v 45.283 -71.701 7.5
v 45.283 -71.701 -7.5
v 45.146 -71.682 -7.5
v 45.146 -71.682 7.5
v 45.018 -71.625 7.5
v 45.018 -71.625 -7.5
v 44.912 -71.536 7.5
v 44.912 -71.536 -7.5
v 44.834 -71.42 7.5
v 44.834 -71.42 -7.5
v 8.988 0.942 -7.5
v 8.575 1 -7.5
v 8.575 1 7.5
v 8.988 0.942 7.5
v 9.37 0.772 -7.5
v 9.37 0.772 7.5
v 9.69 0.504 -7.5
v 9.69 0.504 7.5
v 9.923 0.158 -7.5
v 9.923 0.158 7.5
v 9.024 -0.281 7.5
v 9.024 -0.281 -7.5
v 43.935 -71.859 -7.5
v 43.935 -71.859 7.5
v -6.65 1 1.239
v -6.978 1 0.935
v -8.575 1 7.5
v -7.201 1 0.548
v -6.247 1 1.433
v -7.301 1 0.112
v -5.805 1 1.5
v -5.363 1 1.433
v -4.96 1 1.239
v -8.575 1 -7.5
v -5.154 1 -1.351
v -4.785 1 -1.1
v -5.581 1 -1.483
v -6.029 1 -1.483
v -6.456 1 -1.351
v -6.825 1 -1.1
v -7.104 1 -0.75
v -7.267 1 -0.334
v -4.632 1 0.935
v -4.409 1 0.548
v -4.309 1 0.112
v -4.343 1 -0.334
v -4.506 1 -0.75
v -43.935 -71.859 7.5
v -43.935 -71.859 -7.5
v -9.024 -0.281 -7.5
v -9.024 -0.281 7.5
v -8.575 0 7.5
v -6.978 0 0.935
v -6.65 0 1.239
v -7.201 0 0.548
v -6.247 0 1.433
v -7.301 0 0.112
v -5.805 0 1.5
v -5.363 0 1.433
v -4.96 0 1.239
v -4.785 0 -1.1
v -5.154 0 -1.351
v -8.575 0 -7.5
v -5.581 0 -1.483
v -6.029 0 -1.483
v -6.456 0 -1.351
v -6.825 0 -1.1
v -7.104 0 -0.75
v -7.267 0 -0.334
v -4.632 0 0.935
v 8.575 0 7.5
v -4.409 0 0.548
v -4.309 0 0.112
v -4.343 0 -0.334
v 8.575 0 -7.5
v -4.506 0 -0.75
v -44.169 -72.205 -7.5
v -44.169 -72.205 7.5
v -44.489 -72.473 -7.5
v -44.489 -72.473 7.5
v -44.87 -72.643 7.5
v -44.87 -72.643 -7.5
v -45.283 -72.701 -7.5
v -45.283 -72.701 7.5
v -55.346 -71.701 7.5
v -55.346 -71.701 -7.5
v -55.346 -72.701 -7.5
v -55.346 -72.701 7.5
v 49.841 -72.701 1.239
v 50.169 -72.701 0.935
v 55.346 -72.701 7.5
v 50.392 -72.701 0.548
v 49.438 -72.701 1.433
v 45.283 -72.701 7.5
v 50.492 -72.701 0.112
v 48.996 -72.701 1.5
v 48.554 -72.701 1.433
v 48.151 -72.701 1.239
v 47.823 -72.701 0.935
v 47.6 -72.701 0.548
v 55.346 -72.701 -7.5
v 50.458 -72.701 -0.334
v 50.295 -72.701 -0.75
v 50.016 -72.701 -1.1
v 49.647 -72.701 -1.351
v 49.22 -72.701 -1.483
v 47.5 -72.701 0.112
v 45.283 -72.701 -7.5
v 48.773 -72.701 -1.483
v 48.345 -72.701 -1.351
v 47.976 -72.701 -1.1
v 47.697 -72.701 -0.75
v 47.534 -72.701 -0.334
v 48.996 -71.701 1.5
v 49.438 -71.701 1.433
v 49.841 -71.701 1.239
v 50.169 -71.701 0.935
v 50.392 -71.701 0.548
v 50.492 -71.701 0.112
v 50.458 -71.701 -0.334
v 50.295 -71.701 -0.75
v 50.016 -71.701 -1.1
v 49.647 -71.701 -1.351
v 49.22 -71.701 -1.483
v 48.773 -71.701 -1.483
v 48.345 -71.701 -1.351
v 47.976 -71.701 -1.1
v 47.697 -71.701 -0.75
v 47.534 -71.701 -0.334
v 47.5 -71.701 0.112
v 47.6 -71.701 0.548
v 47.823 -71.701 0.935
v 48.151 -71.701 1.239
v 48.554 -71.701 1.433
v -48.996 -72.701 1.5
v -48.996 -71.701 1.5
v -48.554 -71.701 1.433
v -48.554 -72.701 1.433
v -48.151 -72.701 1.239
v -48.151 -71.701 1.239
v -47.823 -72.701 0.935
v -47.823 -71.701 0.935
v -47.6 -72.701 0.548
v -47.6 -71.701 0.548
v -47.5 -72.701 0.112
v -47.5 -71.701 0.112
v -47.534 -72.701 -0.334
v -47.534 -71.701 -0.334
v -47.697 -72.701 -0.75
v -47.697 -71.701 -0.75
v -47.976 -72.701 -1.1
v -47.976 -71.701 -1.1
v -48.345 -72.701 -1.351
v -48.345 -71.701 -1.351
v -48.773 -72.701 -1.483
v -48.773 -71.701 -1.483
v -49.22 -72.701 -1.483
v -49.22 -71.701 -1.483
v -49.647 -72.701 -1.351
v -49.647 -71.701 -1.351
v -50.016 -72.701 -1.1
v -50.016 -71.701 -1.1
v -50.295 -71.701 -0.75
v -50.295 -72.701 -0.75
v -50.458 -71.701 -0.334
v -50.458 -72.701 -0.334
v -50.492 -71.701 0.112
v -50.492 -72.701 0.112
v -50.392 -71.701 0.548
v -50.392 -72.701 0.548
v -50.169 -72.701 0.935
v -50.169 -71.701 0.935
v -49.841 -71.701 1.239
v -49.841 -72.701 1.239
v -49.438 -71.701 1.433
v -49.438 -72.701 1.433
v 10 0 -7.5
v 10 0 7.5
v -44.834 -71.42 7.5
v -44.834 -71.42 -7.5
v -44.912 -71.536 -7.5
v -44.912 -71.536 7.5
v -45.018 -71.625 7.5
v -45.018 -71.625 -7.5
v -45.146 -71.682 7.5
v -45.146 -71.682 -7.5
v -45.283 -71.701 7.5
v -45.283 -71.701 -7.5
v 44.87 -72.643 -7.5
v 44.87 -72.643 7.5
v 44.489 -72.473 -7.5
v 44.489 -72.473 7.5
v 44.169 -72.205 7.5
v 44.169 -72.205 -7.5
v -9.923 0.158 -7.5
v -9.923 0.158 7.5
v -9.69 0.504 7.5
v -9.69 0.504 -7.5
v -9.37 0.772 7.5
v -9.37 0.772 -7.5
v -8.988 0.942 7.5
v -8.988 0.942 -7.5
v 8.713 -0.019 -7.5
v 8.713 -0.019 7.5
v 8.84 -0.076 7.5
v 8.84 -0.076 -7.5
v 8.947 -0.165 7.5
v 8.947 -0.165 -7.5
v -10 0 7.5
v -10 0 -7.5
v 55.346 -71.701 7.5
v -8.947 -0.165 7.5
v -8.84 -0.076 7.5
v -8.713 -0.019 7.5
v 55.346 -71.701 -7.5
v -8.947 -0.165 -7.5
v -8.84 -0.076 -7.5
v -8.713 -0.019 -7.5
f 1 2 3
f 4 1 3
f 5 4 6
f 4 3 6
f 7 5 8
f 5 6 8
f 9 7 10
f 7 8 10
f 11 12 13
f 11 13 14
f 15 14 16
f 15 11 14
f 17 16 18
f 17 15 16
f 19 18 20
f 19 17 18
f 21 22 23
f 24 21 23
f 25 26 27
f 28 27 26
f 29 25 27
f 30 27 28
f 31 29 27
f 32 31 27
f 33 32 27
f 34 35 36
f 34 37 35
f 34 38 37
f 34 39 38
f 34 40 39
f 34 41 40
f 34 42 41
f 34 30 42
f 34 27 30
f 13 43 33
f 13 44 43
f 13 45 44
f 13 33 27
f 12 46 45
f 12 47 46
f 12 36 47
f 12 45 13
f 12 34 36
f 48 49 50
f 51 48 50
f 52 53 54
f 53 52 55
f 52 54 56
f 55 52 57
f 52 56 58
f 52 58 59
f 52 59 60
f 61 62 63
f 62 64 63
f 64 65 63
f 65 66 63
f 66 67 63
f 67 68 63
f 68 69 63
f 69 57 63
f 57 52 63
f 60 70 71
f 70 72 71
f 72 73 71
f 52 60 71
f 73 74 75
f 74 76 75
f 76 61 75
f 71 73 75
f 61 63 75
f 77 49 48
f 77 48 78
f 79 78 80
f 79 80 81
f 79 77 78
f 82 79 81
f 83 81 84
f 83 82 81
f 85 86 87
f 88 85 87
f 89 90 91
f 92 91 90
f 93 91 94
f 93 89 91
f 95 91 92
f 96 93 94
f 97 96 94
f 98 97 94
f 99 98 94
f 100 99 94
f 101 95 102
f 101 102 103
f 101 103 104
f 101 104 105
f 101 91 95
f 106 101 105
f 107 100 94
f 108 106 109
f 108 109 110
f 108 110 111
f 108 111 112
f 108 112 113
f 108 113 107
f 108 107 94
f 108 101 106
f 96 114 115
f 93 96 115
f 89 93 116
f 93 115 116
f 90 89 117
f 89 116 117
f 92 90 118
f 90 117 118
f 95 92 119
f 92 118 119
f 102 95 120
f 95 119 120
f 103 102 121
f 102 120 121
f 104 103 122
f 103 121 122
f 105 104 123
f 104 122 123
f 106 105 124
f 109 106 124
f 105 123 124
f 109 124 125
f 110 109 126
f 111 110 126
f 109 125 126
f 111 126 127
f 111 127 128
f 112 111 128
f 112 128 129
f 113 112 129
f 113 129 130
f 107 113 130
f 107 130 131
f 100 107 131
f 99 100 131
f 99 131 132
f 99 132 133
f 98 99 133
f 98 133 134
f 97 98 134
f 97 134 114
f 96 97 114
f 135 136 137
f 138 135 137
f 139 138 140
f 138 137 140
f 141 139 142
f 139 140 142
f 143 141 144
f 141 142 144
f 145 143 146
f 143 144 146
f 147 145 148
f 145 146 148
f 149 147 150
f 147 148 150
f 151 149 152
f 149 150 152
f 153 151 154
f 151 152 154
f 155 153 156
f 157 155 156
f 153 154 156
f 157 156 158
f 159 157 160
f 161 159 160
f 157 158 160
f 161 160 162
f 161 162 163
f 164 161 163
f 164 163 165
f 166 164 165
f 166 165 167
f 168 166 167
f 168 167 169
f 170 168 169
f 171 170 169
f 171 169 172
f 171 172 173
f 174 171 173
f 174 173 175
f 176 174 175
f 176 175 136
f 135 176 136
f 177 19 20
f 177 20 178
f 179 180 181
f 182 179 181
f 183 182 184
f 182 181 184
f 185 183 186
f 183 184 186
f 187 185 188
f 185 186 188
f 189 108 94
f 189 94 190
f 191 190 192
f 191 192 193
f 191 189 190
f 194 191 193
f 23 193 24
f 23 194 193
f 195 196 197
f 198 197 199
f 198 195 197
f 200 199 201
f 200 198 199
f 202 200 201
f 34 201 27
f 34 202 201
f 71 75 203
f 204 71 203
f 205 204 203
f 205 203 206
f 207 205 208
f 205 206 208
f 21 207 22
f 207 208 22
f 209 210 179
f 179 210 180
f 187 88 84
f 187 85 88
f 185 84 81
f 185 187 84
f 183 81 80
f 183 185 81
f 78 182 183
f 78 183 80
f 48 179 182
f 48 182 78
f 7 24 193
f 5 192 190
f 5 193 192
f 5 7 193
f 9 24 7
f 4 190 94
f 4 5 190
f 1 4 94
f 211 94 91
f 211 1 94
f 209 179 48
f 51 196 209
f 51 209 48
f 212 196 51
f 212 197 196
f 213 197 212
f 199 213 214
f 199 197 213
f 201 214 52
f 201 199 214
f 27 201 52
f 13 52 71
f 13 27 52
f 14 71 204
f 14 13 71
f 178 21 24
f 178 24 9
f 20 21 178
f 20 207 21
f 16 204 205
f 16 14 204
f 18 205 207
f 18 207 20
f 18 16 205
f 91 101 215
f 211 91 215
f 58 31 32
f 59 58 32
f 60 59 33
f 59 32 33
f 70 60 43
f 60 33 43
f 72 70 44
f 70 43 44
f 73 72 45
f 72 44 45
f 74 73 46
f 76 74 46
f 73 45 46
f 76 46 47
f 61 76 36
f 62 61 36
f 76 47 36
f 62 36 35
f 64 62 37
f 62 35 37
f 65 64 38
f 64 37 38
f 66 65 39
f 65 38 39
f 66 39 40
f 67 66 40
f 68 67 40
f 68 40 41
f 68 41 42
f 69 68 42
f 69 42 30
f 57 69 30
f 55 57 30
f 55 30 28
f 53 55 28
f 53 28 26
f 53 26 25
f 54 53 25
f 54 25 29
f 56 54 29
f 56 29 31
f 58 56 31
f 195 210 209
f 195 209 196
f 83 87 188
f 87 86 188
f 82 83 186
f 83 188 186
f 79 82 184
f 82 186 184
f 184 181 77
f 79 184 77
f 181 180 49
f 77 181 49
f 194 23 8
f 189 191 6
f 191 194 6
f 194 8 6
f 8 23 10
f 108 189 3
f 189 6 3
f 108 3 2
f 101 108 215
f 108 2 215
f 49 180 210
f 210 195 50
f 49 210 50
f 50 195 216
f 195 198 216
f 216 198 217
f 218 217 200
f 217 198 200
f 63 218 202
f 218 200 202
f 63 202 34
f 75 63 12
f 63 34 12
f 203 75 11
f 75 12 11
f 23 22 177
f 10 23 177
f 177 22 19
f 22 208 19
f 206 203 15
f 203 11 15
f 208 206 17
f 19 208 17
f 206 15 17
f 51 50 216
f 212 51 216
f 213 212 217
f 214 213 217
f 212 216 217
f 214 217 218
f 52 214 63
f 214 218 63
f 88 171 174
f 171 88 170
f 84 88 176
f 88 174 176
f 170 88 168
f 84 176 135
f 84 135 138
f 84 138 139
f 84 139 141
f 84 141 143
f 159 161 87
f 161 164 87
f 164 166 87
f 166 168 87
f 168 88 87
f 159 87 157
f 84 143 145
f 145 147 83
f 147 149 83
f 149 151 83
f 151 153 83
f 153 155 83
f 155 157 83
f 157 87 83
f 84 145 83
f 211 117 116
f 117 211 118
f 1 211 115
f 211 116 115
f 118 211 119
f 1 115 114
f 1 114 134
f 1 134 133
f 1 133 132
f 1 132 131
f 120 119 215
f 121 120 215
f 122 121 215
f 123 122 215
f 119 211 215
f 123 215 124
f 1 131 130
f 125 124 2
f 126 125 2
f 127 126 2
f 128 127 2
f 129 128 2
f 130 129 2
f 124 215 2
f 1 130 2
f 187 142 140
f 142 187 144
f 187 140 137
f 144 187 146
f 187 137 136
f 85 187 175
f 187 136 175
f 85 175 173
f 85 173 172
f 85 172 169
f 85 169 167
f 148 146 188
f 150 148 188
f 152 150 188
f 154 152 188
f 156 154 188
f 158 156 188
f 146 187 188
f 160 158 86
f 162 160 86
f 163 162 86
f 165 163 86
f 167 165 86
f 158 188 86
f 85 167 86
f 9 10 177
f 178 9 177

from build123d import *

# Parameters (mm, degrees)
SKETCH_1_W               = 20
SKETCH_1_H               = 15
EXTRUDE_1_DEPTH          = 1
SM_START                 = -7.5
SM_EDGE_FLANGE_2_DEPTH   = 15
SM_EDGE_FLANGE_2_2_DEPTH = 15
SM_EDGE_FLANGE_3_DEPTH   = 15
SM_EDGE_FLANGE_3_2_DEPTH = 15
SKETCH_27_R              = 1.5
CUT_EXTRUDE_1_DEPTH      = 5
SKETCH_28_R              = 1.5
CUT_EXTRUDE_2_DEPTH      = 10


# Read off the part's stored shape, not the designer's step: Ребро-кромка2, Ребро-кромка3
with BuildPart() as part:
    # Sketch 1 → Бобышка-Вытянуть1 (new body)
    with BuildSketch(Plane(origin=(0, 0, 0), x_dir=(1, 0, 0), z_dir=(0, 1, 0))):
        Rectangle(SKETCH_1_W, SKETCH_1_H)
    extrude(amount=EXTRUDE_1_DEPTH)

    # Ребро-кромка2 outline → Ребро-кромка2 (cut)
    with BuildSketch(Plane.XY.offset(SM_START)):
        with BuildLine():
            Line((-10, 0), (-9.923154453, 0.15755672))
            ThreePointArc((-9.923154453, 0.15755672), (-9.36984228, 0.772072144), (-8.574963384, 1))
            Line((-8.574963384, 1), (-10, 1))
            Line((-10, 1), (-10, 0))
        make_face()
        with BuildLine():
            Line((10, 1), (8.574963384, 1))
            ThreePointArc((8.574963384, 1), (9.36984228, 0.772072144), (9.923154453, 0.15755672))
            Line((9.923154453, 0.15755672), (10, 0))
            Line((10, 0), (10, 1))
        make_face()
    extrude(amount=SM_EDGE_FLANGE_2_DEPTH, mode=Mode.SUBTRACT)

    # Sm Edge Flange 2 2 outline → Sm Edge Flange 2 2 (add)
    with BuildSketch(Plane.XY.offset(SM_START)):
        with BuildLine():
            Line((-8.574963384, 0), (-10, 0))
            Line((-10, 0), (-45.458701448, -72.701111797))
            Line((-45.458701448, -72.701111797), (-44.559907402, -73.139482943))
            Line((-44.559907402, -73.139482943), (-9.024360407, -0.280814427))
            ThreePointArc((-9.024360407, -0.280814427), (-8.839923016, -0.075975952), (-8.574963384, 0))
        make_face()
        with BuildLine():
            Line((10, 0), (8.574963384, 0))
            ThreePointArc((8.574963384, 0), (8.839923016, -0.075975952), (9.024360407, -0.280814427))
            Line((9.024360407, -0.280814427), (44.559907402, -73.139482943))
            Line((44.559907402, -73.139482943), (45.458701448, -72.701111797))
            Line((45.458701448, -72.701111797), (10, 0))
        make_face()
    extrude(amount=SM_EDGE_FLANGE_2_2_DEPTH)

    # Ребро-кромка3 outline → Ребро-кромка3 (cut)
    with BuildSketch(Plane.XY.offset(SM_START)):
        with BuildLine():
            ThreePointArc((-43.935212466, -71.858668517), (-44.488524639, -72.473183941), (-45.283403536, -72.701111797))
            Line((-45.283403536, -72.701111797), (-45.458701448, -72.701111797))
            Line((-45.458701448, -72.701111797), (-44.559907402, -73.139482943))
            Line((-44.559907402, -73.139482943), (-43.935212466, -71.858668517))
        make_face()
        with BuildLine():
            Line((44.559907402, -73.139482943), (45.458701448, -72.701111797))
            Line((45.458701448, -72.701111797), (45.283403536, -72.701111797))
            ThreePointArc((45.283403536, -72.701111797), (44.488524639, -72.473183941), (43.935212466, -71.858668517))
            Line((43.935212466, -71.858668517), (44.559907402, -73.139482943))
        make_face()
    extrude(amount=SM_EDGE_FLANGE_3_DEPTH, mode=Mode.SUBTRACT)

    # Sm Edge Flange 3 2 outline → Sm Edge Flange 3 2 (add)
    with BuildSketch(Plane.XY.offset(SM_START)):
        with BuildLine():
            Line((-55.346099508, -72.701111797), (-45.458701448, -72.701111797))
            Line((-45.458701448, -72.701111797), (-44.834006512, -71.42029737))
            ThreePointArc((-44.834006512, -71.42029737), (-45.018443903, -71.625135845), (-45.283403536, -71.701111797))
            Line((-45.283403536, -71.701111797), (-55.346099508, -71.701111797))
            Line((-55.346099508, -71.701111797), (-55.346099508, -72.701111797))
        make_face()
        with BuildLine():
            Line((45.458701448, -72.701111797), (55.346099508, -72.701111797))
            Line((55.346099508, -72.701111797), (55.346099508, -71.701111797))
            Line((55.346099508, -71.701111797), (45.283403536, -71.701111797))
            ThreePointArc((45.283403536, -71.701111797), (45.018443903, -71.625135845), (44.834006512, -71.42029737))
            Line((44.834006512, -71.42029737), (45.458701448, -72.701111797))
        make_face()
    extrude(amount=SM_EDGE_FLANGE_3_2_DEPTH)

    # Эскиз27 → Вырез-Вытянуть1 (cut)
    with BuildSketch(Plane(origin=(0, -71.701111797, 0), x_dir=(1, 0, 0), z_dir=(0, 1, 0))):
        with Locations(Location((-48.996099508, 0, 0), (0, 0, 270))):
            Circle(SKETCH_27_R)
        with Locations(Location((48.996099508, 0, 0), (0, 0, 270))):
            Circle(SKETCH_27_R)
    extrude(amount=-CUT_EXTRUDE_1_DEPTH, mode=Mode.SUBTRACT)

    # Эскиз28 → Вырез-Вытянуть2 (cut)
    with BuildSketch(Plane(origin=(0, 1, 0), x_dir=(1, 0, 0), z_dir=(0, 1, 0))):
        with Locations(Location((-5.804963384, 0, 0), (0, 0, 270))):
            Circle(SKETCH_28_R)
    extrude(amount=-CUT_EXTRUDE_2_DEPTH, mode=Mode.SUBTRACT)


solid = part.part
